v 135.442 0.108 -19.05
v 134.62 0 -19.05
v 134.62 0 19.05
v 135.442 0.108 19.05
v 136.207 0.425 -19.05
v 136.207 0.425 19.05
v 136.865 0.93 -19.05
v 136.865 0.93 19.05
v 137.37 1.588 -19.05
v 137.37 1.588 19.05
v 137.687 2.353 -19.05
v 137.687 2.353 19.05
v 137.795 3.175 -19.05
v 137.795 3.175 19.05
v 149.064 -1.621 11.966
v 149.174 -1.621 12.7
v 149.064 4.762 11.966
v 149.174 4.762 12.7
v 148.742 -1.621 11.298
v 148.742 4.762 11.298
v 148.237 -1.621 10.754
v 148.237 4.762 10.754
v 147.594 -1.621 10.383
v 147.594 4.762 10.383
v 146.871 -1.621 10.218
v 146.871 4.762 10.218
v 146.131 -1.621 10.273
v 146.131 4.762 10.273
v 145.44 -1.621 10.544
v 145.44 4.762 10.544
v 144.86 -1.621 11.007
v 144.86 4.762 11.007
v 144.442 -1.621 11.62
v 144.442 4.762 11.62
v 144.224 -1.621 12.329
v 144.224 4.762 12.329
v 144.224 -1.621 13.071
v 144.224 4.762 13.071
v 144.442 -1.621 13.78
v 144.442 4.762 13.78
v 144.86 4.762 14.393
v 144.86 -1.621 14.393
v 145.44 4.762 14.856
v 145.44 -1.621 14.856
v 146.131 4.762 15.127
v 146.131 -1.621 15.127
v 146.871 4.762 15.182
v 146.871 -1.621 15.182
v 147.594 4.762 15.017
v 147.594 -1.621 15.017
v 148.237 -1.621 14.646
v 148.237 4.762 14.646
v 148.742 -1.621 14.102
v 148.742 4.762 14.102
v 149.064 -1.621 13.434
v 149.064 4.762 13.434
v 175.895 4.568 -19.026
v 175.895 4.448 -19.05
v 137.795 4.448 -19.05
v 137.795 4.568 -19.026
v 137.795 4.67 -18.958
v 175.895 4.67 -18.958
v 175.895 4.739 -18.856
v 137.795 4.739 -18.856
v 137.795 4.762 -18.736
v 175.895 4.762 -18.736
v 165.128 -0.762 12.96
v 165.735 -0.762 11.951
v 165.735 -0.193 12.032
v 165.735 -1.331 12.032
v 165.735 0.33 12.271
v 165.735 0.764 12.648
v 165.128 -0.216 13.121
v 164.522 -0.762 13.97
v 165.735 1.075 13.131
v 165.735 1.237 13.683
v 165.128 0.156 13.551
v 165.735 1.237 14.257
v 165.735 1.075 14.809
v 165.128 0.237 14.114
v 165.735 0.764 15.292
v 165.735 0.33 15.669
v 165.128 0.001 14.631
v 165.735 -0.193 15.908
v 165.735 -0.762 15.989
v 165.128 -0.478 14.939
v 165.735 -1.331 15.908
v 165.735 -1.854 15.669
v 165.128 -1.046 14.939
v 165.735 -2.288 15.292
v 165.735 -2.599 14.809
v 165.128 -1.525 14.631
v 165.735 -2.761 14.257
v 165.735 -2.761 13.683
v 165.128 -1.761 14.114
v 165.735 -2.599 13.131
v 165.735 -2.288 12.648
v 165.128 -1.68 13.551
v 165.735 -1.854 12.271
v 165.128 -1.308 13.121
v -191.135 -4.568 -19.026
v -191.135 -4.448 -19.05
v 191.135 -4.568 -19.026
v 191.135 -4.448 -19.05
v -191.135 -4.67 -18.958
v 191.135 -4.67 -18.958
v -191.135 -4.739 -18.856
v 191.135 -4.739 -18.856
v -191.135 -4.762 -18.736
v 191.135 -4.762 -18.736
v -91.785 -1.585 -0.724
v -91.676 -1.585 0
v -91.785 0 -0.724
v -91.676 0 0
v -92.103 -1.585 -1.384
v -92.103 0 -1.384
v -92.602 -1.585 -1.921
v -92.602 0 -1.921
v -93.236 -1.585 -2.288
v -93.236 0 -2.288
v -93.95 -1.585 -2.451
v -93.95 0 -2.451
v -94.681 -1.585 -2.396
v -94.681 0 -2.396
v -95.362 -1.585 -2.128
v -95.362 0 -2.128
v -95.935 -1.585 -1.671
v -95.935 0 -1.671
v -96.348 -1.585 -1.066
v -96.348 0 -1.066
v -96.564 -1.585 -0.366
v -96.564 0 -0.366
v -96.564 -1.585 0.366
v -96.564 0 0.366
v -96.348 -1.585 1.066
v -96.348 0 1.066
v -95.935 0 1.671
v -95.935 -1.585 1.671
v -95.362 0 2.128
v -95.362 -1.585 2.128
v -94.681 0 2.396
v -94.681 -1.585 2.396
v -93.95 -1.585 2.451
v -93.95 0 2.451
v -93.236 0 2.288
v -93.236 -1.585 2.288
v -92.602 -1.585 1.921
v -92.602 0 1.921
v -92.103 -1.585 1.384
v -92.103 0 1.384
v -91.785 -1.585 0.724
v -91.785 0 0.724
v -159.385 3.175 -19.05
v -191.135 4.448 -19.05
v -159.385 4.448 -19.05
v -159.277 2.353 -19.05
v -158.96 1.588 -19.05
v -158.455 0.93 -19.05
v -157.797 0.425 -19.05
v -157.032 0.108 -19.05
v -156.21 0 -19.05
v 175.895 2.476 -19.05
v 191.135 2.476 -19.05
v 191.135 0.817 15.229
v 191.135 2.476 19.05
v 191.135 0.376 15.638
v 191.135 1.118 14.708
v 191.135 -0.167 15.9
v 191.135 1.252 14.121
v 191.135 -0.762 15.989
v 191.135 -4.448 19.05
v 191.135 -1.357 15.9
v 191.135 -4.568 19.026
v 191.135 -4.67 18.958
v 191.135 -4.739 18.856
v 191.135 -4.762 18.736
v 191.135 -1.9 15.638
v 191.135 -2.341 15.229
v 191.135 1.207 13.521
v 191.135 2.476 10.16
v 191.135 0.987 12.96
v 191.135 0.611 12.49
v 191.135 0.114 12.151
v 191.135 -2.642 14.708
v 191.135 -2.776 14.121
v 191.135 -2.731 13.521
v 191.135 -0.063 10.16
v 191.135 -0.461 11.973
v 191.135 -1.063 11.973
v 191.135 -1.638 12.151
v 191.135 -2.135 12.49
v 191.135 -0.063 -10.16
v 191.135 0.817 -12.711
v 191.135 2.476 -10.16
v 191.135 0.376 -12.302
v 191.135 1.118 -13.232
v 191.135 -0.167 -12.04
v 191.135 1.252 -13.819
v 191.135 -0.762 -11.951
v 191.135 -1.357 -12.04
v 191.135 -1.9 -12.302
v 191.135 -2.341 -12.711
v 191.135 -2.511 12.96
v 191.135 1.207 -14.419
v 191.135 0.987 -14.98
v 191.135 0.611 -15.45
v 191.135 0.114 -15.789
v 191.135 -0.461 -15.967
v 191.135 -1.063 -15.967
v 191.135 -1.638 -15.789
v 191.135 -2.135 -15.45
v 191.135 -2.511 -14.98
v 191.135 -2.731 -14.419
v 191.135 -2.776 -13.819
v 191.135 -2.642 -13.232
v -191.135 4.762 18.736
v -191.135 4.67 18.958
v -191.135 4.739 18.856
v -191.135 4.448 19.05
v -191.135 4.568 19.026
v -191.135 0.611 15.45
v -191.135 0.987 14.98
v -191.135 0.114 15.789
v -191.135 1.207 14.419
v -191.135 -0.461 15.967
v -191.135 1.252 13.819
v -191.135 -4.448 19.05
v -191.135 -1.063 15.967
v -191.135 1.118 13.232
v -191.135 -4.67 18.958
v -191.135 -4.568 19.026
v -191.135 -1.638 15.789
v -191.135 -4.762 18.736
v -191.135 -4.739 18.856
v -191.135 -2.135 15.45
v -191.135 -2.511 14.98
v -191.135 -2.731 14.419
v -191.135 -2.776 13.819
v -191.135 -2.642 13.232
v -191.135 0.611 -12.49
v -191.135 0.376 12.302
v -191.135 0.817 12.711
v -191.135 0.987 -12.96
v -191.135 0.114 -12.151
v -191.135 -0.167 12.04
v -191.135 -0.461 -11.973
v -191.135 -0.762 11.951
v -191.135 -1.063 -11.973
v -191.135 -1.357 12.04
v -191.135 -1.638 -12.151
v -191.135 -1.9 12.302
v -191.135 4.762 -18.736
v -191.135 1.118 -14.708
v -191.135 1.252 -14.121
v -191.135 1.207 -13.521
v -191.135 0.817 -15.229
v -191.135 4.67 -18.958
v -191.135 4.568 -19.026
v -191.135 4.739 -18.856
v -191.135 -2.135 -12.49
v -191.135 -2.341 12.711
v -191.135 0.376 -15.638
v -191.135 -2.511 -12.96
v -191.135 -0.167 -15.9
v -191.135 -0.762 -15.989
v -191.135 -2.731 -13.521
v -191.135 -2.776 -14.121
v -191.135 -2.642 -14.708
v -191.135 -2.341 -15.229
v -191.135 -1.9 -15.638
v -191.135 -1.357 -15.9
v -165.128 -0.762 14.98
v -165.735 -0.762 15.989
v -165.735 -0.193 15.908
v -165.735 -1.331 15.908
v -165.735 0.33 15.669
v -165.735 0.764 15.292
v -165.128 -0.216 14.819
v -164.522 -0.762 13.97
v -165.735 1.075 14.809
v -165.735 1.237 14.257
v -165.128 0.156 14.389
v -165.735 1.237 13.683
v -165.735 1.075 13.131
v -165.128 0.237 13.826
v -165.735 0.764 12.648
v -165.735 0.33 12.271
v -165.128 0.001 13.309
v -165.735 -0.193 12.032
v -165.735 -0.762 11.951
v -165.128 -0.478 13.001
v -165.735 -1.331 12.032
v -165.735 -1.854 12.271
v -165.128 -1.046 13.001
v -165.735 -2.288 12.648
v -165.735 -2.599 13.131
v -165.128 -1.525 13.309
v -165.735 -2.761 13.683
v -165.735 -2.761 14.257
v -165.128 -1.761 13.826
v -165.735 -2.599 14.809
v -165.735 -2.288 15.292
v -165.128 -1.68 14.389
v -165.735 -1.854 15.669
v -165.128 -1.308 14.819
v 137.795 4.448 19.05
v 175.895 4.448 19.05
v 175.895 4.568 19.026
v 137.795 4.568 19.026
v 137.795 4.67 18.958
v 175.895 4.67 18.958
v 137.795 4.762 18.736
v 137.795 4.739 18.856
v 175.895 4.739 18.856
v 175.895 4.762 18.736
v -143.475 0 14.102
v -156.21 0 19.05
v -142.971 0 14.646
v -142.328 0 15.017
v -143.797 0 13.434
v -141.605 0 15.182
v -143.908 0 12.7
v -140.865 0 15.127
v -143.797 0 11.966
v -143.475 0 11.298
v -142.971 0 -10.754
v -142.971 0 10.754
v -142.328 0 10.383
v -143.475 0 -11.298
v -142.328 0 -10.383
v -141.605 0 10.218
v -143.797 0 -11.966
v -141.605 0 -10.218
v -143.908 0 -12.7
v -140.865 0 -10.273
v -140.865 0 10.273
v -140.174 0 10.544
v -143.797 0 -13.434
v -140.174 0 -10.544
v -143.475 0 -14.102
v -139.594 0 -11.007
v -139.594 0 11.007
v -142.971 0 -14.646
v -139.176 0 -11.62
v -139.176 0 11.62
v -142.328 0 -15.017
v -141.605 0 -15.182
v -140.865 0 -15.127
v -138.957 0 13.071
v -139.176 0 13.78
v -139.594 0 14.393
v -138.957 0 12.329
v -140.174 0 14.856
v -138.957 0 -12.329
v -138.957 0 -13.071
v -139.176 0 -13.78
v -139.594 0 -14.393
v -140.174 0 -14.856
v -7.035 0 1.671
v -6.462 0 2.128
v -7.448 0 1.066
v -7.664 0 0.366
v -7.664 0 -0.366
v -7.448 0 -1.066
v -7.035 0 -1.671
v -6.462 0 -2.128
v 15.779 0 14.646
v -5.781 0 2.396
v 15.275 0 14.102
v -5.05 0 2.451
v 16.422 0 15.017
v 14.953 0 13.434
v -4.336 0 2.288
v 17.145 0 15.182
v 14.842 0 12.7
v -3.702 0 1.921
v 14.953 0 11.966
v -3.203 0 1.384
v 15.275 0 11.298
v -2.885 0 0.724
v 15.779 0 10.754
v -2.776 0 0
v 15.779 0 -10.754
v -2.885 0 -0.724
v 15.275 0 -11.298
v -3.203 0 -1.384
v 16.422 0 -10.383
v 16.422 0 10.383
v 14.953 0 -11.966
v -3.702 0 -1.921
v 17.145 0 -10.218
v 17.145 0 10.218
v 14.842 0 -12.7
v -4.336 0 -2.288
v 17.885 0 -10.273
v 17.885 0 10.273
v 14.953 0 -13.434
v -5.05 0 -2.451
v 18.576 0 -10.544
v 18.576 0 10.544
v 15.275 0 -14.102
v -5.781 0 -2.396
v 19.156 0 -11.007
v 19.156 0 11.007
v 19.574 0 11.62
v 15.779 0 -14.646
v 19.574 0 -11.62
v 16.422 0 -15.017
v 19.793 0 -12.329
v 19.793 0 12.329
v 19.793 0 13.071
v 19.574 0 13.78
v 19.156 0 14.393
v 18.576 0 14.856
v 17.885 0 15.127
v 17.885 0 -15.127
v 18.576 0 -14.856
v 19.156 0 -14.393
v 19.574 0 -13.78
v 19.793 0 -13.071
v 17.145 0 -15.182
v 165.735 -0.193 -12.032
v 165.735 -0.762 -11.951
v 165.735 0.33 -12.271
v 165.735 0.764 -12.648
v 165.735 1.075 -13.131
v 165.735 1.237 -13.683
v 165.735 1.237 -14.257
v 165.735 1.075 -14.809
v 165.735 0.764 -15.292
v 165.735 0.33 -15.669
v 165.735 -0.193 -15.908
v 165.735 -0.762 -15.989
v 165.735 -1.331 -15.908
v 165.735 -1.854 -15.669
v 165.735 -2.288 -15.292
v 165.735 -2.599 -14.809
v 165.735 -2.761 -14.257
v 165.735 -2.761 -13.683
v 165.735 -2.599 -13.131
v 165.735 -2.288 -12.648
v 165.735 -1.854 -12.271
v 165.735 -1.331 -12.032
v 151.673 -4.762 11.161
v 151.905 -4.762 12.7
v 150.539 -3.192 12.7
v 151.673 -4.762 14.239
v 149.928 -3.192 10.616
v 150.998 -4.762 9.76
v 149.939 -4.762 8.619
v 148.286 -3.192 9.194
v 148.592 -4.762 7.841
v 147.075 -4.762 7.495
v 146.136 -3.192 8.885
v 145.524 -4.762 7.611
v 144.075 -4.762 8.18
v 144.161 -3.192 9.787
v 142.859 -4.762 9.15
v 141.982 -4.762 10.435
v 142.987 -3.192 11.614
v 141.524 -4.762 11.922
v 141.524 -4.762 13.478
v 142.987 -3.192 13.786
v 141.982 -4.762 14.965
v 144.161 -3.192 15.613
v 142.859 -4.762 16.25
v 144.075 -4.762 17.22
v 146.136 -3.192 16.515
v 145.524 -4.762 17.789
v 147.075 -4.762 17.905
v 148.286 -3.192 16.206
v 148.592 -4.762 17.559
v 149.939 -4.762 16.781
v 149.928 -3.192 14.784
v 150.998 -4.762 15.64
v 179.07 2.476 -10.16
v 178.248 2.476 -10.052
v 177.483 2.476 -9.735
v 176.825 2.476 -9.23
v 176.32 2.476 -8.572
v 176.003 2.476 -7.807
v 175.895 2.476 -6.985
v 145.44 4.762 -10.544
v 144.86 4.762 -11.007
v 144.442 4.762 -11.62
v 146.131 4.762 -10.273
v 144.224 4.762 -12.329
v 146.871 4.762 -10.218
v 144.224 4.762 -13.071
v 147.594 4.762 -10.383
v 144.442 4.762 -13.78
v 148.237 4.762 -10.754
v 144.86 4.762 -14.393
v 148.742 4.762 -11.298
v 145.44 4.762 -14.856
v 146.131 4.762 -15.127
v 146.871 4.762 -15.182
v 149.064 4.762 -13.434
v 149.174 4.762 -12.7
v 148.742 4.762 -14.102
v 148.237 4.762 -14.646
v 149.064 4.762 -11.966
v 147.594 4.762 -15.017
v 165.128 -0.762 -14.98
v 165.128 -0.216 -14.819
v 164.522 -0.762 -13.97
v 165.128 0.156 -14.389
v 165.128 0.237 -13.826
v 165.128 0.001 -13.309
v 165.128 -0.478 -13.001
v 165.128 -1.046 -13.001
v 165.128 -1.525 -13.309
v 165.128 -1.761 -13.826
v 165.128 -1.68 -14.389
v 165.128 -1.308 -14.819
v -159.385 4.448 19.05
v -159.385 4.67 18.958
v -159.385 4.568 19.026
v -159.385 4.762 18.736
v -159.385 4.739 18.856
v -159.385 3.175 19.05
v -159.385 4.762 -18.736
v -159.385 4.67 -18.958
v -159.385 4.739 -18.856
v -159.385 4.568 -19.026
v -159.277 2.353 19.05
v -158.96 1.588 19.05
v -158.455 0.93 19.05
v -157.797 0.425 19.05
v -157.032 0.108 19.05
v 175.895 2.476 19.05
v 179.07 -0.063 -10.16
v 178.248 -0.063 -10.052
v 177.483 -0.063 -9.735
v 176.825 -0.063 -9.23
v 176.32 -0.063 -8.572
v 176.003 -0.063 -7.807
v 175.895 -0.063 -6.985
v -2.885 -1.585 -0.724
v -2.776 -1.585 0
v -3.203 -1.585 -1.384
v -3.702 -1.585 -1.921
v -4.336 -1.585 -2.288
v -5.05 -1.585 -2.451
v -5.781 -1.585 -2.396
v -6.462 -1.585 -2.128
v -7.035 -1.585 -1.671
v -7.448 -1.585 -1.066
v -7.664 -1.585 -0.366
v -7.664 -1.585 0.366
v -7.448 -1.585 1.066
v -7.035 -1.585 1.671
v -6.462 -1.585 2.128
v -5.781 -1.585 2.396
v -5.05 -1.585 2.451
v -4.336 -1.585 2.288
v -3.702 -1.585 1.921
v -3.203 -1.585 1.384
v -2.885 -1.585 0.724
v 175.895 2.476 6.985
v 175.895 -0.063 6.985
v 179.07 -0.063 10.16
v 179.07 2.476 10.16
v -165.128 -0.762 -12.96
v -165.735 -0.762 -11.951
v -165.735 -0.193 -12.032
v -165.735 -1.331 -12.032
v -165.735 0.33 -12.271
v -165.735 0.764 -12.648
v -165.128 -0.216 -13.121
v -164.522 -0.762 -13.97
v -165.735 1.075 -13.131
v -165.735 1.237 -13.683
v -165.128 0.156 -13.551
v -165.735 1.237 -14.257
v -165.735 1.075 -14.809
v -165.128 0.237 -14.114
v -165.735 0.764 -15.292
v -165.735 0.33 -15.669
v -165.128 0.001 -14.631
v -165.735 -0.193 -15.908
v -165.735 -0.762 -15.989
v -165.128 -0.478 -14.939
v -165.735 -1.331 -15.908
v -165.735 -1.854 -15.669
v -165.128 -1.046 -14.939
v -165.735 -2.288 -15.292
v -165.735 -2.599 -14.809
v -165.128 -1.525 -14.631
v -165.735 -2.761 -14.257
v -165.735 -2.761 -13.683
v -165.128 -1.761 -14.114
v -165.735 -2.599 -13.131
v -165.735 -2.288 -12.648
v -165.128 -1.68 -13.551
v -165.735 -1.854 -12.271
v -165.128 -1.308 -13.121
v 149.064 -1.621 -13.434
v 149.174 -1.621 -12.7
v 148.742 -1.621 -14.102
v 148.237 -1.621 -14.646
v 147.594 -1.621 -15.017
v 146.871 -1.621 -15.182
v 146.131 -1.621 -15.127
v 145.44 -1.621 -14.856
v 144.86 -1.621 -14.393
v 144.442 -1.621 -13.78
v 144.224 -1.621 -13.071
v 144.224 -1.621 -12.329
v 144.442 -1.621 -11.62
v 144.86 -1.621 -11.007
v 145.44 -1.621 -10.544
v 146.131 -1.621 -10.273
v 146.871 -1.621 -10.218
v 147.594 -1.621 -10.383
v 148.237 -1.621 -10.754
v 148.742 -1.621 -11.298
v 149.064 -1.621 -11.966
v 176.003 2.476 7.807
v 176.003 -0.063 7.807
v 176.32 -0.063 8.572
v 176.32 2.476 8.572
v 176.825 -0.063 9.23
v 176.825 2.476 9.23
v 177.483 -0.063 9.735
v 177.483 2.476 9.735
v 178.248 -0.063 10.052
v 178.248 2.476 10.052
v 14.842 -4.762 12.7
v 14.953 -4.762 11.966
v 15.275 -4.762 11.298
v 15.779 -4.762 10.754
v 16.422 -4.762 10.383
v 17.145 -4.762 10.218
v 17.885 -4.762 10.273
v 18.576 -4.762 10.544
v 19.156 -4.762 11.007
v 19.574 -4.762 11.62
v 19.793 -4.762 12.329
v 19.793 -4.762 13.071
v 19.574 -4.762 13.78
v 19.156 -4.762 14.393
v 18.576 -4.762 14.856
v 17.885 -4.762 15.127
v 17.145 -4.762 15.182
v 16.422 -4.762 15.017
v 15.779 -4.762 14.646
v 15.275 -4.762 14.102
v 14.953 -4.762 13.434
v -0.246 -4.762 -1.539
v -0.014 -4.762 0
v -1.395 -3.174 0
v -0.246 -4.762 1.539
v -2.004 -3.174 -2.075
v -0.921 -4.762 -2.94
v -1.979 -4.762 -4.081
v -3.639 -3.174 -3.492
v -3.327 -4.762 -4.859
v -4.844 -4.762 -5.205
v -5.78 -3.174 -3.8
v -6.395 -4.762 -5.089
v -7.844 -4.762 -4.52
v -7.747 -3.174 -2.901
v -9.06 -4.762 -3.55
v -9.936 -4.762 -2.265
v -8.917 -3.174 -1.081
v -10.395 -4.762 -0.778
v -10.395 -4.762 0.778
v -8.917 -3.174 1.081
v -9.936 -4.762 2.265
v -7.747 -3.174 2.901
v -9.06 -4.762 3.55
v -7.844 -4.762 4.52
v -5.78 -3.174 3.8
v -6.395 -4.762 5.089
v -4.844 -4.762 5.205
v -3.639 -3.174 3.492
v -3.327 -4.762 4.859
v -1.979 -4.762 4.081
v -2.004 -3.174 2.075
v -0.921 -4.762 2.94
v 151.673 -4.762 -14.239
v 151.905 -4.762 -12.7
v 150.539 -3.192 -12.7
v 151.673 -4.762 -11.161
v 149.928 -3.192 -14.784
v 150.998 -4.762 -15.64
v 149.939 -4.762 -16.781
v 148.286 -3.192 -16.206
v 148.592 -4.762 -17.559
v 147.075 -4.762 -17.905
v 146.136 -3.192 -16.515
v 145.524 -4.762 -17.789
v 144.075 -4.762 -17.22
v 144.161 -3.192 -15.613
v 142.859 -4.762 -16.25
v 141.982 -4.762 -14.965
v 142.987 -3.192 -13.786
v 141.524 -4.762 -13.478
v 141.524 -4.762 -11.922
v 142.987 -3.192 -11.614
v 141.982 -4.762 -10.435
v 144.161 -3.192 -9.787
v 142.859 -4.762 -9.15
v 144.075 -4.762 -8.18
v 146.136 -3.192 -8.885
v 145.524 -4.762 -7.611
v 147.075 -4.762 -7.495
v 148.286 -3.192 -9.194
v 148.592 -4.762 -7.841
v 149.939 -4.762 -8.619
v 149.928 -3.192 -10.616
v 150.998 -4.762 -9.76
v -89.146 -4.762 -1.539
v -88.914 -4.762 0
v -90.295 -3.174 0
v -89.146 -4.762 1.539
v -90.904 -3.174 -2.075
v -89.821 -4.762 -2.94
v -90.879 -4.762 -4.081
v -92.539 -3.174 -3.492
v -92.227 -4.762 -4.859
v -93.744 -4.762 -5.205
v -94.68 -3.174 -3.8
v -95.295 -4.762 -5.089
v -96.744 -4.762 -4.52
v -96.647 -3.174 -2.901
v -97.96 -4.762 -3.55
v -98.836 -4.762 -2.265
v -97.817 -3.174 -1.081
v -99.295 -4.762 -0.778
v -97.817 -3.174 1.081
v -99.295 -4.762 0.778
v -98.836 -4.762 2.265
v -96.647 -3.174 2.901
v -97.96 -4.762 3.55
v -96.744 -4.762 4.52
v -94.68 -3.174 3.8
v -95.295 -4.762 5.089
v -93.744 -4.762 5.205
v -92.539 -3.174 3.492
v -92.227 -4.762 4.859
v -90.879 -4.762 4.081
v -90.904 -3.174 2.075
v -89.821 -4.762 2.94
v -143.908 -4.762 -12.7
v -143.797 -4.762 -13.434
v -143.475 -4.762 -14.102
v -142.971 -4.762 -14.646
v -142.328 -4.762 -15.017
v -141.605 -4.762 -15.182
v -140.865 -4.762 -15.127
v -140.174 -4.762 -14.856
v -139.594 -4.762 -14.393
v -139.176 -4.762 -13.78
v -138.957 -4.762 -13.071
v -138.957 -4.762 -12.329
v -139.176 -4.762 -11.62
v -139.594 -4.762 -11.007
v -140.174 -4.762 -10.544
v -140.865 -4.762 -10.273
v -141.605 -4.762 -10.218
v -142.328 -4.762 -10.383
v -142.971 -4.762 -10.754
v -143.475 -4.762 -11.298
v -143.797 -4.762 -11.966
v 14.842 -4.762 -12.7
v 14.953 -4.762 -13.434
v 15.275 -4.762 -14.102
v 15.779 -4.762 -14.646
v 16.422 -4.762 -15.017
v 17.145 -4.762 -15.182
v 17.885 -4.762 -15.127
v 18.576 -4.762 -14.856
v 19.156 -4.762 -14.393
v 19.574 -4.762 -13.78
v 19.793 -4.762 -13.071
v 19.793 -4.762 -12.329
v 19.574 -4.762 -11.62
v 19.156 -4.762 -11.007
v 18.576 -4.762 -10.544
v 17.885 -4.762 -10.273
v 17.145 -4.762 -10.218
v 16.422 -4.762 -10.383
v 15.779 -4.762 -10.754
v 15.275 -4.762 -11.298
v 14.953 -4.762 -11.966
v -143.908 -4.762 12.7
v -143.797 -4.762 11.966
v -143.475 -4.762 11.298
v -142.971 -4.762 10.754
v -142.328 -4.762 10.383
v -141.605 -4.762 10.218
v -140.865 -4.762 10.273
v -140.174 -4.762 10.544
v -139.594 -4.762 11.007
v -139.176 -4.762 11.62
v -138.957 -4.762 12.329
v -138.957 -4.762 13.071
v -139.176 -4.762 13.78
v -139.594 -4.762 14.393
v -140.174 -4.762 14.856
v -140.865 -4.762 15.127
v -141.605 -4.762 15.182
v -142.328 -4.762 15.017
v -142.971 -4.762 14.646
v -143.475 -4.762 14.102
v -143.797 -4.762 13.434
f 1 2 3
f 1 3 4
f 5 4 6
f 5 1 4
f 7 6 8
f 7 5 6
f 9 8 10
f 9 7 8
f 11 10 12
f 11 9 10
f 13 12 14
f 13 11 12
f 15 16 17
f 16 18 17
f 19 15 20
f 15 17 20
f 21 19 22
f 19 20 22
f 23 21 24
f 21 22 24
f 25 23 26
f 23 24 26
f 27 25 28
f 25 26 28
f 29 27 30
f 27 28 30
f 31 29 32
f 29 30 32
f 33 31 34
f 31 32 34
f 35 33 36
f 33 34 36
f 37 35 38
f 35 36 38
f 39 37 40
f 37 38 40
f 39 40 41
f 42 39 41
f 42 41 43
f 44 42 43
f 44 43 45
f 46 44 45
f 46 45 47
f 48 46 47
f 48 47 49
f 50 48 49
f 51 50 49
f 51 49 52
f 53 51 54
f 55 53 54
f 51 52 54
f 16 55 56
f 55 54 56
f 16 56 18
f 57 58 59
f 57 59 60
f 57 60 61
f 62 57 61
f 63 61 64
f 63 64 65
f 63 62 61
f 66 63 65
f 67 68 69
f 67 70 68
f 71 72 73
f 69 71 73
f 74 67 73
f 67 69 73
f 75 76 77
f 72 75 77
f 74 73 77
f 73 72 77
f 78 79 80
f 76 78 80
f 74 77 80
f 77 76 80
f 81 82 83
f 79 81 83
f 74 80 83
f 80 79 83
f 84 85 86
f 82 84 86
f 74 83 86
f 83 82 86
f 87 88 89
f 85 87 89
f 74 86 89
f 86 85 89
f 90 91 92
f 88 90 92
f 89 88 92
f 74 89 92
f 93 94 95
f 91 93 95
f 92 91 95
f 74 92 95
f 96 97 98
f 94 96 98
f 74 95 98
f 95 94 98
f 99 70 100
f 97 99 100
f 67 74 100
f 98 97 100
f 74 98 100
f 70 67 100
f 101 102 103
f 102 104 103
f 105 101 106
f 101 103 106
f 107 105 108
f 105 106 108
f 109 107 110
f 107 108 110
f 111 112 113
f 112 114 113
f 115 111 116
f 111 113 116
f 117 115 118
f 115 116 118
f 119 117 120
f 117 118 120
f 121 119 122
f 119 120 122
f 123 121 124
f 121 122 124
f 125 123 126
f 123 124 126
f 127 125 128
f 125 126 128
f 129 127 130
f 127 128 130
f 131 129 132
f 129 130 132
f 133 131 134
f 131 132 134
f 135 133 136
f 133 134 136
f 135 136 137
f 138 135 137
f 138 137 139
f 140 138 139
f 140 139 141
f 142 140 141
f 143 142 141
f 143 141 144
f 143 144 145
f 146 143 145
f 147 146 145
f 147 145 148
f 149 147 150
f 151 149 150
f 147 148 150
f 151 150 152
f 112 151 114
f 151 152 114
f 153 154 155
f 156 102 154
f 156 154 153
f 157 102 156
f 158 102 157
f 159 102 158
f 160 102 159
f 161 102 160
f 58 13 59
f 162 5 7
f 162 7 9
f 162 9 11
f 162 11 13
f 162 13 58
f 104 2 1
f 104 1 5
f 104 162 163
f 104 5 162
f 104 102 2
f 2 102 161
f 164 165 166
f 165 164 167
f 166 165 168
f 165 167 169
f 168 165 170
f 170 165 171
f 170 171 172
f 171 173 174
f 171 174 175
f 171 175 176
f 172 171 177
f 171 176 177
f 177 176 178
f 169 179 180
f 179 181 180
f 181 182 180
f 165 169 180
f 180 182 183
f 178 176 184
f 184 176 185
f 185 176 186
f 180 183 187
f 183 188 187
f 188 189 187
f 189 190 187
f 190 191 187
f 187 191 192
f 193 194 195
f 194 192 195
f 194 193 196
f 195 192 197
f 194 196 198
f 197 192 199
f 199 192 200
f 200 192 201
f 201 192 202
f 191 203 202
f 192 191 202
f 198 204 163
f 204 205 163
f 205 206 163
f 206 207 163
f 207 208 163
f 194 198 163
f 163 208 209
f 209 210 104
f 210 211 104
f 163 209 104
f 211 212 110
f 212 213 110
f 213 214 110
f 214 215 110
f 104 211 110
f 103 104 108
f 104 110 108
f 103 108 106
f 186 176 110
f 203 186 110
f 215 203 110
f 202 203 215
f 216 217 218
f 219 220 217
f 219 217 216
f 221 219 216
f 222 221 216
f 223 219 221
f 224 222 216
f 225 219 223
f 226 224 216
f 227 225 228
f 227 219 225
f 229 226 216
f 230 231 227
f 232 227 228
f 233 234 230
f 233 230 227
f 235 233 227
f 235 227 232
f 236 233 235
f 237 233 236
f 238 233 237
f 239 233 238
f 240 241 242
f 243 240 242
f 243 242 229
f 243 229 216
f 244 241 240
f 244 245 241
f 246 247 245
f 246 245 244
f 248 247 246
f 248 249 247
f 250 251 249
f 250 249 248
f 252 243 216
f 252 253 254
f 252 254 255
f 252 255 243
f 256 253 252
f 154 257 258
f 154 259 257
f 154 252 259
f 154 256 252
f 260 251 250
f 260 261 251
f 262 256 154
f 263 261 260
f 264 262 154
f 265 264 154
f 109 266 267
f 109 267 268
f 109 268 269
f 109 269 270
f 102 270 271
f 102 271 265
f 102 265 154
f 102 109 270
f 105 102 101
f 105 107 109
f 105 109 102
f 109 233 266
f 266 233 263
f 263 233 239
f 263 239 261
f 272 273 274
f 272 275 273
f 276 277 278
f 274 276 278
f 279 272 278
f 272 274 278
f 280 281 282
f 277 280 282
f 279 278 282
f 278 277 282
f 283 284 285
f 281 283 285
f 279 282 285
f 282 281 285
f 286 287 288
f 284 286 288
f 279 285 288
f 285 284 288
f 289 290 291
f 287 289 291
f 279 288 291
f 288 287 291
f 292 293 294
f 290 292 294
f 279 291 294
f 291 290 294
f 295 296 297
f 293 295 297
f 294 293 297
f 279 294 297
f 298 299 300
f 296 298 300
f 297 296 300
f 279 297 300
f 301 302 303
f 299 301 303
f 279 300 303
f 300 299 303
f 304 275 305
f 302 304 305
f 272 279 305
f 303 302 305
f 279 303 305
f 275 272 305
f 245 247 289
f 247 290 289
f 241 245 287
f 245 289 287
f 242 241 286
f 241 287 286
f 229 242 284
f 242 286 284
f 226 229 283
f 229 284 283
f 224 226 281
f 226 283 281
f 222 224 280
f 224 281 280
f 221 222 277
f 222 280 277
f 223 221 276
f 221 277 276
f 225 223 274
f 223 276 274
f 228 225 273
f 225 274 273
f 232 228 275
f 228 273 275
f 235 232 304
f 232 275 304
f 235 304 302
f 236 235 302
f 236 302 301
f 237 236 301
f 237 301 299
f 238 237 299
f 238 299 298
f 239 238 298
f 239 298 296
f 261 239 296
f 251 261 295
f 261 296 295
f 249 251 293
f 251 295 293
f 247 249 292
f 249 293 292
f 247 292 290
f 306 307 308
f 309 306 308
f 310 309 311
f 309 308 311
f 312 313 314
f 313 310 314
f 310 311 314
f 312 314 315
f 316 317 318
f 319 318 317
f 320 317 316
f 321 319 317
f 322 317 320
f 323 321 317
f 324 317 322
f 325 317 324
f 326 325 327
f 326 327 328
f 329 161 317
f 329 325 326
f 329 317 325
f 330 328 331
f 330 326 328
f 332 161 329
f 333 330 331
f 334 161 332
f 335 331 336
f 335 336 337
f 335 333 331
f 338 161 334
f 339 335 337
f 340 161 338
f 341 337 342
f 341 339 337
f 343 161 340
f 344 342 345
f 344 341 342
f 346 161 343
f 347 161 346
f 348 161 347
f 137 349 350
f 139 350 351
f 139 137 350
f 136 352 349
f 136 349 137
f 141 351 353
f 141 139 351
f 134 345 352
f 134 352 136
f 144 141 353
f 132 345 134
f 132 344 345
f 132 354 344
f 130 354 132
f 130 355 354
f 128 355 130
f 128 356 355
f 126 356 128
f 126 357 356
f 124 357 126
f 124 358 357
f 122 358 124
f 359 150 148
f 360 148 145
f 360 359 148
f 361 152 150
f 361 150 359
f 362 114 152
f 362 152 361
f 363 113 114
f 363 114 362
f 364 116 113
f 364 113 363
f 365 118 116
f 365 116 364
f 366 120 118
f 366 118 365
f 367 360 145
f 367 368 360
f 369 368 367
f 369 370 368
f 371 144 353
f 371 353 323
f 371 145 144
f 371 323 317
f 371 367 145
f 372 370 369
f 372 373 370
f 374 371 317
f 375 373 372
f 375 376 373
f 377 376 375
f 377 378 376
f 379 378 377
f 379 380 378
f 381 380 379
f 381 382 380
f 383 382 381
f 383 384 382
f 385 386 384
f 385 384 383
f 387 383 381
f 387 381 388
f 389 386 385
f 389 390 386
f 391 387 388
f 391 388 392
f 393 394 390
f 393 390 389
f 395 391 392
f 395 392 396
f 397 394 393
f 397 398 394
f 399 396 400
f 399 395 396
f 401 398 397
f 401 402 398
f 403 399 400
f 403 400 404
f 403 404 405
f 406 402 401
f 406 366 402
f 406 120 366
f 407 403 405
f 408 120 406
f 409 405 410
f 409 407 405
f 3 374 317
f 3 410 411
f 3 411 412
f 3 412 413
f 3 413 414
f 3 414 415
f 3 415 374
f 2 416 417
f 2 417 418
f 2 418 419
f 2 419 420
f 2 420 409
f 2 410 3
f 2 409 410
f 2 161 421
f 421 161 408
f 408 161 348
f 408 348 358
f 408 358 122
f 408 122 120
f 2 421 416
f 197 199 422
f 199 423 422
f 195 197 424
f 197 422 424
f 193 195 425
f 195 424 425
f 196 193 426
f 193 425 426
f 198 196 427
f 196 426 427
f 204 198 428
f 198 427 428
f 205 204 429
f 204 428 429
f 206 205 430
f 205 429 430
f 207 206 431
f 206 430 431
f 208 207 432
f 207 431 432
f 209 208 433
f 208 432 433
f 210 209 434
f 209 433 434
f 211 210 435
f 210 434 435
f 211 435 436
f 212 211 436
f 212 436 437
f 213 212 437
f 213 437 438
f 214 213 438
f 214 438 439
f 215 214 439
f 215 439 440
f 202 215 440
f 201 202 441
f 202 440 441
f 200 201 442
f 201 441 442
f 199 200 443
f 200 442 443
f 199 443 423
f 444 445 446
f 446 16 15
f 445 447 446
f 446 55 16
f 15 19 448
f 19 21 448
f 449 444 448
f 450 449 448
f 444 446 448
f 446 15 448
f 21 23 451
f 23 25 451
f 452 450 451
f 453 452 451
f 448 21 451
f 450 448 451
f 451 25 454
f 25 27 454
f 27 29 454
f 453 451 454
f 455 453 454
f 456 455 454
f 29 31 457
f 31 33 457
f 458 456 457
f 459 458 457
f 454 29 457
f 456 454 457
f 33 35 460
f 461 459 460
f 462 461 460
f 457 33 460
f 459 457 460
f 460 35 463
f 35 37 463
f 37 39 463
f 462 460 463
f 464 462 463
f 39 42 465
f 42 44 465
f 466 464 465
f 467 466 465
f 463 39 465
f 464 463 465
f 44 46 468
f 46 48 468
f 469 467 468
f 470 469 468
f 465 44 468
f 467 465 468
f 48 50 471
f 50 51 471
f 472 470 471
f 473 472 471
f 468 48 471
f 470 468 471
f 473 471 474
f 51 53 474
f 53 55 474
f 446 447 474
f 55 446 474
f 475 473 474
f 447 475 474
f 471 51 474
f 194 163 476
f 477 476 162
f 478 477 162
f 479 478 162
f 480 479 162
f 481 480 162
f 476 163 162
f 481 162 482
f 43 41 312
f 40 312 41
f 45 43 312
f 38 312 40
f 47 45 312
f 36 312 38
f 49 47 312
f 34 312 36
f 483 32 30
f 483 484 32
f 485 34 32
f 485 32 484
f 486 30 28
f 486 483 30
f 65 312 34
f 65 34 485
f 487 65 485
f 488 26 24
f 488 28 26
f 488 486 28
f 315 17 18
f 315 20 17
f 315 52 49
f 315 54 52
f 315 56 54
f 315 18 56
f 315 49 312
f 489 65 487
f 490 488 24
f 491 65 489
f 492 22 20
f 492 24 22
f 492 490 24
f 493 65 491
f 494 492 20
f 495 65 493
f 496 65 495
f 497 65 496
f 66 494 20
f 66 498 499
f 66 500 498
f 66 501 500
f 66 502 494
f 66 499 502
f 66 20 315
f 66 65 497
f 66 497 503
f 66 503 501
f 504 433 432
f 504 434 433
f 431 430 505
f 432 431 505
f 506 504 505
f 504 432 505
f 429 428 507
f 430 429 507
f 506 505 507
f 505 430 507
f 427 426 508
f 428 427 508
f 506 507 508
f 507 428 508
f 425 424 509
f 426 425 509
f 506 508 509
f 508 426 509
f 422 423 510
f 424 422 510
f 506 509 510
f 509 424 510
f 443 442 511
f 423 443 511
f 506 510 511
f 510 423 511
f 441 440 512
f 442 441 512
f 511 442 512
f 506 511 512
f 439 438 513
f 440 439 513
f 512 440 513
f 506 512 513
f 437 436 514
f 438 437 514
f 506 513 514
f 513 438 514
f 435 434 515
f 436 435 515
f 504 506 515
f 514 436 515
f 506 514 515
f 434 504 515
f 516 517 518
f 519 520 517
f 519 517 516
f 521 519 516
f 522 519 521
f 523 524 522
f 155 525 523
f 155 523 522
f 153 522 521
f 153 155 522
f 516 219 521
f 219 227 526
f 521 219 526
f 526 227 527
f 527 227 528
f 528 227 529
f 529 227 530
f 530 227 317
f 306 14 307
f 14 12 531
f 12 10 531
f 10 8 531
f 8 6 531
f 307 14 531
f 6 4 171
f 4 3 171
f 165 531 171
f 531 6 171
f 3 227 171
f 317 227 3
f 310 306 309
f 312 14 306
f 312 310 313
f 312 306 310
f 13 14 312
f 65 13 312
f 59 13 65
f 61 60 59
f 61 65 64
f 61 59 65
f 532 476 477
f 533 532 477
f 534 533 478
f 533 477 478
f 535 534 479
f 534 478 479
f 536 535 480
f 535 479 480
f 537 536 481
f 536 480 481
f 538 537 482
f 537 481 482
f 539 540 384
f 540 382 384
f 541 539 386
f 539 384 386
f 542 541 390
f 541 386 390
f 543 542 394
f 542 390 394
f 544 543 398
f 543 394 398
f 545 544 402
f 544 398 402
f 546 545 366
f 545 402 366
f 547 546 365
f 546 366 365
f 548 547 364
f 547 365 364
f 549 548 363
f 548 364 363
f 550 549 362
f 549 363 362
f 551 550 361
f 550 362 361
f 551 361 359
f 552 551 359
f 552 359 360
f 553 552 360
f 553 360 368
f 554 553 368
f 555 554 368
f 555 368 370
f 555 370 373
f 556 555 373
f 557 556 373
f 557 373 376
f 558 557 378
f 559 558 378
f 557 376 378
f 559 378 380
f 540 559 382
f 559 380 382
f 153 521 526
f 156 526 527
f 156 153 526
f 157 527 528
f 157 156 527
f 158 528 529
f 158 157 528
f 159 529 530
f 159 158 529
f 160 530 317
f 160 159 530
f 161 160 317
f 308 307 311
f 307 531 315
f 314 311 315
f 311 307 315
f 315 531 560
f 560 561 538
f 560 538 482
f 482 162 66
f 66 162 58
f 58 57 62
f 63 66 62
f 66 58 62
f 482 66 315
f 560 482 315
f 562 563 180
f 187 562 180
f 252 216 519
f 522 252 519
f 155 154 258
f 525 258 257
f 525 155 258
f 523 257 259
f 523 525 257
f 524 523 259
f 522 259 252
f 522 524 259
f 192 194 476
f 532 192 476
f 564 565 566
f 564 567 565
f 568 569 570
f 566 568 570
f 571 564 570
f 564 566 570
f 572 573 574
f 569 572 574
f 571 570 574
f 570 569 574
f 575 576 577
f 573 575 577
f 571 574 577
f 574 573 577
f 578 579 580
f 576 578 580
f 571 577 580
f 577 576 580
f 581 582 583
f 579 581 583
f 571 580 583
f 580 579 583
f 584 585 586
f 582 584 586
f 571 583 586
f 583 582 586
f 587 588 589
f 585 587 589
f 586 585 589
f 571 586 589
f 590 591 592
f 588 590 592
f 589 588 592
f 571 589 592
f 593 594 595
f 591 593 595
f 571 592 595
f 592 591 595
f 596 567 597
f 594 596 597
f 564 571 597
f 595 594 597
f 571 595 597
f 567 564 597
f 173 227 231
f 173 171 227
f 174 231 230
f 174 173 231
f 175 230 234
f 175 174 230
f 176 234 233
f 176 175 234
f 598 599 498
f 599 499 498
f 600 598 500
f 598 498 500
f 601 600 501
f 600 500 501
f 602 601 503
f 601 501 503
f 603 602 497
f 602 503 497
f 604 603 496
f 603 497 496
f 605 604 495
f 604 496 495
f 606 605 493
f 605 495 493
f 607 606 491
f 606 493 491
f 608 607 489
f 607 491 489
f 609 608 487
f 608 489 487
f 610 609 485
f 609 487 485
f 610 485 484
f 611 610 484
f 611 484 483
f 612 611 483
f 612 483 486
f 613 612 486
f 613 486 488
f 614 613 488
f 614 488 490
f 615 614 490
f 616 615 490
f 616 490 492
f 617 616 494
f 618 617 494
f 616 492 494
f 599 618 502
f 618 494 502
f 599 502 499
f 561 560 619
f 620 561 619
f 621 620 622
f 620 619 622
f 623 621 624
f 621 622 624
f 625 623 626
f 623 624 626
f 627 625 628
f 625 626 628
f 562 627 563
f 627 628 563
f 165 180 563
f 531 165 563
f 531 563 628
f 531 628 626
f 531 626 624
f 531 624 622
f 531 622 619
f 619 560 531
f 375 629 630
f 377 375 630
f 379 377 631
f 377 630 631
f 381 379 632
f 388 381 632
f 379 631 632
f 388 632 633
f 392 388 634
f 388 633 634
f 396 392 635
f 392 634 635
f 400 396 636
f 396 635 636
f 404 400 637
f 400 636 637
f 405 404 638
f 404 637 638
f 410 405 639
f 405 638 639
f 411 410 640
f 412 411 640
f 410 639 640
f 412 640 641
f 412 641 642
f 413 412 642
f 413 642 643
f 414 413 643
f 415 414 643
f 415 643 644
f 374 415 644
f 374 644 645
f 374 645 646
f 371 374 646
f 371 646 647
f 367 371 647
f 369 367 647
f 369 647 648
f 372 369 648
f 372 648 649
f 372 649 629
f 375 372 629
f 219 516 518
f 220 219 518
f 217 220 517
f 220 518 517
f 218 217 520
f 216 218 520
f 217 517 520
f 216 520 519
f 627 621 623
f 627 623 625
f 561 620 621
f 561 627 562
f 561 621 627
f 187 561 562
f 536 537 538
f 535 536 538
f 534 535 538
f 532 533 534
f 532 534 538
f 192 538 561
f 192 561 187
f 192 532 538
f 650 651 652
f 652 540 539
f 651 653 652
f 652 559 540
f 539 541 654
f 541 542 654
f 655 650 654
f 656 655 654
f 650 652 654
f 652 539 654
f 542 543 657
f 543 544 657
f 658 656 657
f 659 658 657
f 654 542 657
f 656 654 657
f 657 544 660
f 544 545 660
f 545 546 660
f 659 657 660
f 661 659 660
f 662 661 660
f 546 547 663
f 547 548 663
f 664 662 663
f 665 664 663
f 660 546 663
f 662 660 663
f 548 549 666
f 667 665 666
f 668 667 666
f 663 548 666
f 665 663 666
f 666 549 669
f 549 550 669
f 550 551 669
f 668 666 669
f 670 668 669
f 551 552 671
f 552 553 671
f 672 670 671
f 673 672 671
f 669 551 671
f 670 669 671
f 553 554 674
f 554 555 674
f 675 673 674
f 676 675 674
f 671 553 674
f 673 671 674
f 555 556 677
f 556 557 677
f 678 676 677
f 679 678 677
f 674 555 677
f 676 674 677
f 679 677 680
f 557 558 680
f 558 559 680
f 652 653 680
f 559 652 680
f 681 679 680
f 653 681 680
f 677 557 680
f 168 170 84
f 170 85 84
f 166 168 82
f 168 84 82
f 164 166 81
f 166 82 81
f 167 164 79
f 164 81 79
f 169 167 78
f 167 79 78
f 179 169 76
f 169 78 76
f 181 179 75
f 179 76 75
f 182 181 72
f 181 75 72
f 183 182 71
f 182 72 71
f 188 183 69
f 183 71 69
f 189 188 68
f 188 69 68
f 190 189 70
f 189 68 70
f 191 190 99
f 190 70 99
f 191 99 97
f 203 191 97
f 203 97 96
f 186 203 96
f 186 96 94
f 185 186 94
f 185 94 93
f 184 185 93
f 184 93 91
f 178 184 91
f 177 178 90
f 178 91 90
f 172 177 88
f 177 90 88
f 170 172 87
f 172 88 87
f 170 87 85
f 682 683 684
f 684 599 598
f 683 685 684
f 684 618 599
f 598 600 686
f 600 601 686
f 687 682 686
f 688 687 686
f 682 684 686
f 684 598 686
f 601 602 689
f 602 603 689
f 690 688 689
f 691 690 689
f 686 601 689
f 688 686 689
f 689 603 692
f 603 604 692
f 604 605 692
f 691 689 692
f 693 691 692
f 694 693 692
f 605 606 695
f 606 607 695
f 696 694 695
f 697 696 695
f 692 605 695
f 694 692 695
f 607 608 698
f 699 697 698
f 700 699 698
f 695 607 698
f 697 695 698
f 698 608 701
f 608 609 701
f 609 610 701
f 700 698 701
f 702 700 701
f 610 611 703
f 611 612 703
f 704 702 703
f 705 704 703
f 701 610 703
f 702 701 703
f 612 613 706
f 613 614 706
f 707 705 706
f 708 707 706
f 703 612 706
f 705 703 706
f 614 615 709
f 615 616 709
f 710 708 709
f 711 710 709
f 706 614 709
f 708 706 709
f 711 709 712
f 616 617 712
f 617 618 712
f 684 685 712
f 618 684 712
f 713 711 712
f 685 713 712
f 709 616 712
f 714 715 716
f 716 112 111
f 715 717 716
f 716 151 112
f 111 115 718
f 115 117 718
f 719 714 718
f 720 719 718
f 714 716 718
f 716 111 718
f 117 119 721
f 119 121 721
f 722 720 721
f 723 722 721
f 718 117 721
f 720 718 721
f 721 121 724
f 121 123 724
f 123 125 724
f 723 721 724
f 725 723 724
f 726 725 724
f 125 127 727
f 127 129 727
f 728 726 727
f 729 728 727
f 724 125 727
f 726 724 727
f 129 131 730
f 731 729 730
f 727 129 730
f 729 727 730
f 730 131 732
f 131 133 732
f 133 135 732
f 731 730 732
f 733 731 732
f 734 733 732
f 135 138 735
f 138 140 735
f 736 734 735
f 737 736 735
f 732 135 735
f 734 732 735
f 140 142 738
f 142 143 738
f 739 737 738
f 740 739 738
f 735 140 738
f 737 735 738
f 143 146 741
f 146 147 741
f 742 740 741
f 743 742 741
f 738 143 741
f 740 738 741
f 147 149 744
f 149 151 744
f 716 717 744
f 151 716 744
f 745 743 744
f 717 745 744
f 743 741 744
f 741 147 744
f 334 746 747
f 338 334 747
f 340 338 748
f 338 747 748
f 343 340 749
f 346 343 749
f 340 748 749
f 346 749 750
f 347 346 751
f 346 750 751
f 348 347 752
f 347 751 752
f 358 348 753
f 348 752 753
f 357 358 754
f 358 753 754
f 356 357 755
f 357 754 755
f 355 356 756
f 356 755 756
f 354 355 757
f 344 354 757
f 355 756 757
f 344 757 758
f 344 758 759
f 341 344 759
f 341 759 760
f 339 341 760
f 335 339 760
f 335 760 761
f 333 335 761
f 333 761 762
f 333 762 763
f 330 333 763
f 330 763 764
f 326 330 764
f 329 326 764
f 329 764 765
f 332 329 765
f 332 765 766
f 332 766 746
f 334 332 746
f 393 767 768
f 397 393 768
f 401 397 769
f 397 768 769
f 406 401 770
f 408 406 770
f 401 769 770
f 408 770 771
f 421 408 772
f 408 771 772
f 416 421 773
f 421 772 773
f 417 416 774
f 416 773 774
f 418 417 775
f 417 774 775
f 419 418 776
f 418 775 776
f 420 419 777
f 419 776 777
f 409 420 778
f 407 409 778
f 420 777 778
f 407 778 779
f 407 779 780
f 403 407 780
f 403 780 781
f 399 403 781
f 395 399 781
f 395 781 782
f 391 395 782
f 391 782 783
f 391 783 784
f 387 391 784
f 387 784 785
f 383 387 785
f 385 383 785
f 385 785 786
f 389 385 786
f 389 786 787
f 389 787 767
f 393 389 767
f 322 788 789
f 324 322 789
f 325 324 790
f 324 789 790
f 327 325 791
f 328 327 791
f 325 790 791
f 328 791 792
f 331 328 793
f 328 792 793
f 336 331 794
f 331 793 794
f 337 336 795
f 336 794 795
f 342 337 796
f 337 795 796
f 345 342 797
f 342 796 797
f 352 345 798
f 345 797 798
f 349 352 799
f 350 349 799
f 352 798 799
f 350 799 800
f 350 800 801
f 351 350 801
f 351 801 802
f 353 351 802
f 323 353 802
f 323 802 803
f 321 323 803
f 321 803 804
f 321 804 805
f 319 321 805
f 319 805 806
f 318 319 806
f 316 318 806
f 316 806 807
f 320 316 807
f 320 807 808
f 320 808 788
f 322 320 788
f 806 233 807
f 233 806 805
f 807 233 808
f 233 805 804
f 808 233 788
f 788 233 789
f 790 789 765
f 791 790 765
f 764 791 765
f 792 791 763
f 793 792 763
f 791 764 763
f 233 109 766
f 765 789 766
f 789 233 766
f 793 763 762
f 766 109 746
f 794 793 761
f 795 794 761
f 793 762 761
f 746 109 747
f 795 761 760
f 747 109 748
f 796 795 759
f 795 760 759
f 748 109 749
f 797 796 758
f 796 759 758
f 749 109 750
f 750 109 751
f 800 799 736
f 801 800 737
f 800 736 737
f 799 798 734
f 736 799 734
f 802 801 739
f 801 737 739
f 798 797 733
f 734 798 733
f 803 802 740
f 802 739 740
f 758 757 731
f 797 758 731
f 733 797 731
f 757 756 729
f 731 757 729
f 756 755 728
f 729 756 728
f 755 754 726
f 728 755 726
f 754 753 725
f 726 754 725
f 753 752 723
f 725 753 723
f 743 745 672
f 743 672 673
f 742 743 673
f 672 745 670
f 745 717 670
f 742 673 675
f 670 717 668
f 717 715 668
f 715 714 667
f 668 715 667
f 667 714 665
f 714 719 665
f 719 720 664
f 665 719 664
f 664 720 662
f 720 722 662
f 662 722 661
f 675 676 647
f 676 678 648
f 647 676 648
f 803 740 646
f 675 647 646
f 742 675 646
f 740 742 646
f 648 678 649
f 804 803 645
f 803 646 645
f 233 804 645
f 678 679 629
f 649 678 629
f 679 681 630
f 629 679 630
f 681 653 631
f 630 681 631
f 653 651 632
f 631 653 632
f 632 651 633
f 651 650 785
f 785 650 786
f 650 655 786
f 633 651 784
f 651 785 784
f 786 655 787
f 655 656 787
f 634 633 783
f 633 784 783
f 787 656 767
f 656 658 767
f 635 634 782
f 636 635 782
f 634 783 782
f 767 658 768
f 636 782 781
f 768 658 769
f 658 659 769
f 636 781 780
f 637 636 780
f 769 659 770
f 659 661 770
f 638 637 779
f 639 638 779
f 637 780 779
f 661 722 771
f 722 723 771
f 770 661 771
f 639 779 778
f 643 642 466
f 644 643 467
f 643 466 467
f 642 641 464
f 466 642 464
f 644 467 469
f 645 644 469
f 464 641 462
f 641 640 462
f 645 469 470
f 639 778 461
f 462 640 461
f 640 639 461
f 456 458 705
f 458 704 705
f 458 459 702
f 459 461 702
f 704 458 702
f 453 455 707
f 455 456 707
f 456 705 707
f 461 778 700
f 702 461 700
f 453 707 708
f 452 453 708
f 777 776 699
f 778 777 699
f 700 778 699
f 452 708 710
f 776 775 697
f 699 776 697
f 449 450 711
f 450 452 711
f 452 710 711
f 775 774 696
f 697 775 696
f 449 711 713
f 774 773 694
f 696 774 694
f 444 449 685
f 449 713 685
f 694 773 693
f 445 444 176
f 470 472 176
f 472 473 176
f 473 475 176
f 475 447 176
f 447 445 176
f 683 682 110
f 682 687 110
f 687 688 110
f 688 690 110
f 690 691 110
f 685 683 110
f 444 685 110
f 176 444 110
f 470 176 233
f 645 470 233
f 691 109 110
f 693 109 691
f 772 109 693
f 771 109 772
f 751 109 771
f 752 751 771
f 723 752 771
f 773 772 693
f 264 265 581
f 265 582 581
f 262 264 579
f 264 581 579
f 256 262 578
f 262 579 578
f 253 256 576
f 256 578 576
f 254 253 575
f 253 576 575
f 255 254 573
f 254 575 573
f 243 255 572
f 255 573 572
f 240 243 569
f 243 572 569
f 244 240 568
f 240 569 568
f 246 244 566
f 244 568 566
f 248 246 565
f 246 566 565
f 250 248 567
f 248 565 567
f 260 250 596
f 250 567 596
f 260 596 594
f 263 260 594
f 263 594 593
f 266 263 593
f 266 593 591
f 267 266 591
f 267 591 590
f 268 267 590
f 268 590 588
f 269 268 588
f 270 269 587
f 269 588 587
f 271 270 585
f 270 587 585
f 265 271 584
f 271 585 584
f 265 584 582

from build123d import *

# Parameters (mm, degrees)
BOSS_EXTRUDE1_DEPTH                    = 4.7625
BOSS_EXTRUDE1_DEPTH_BACK               = 4.7625
SKETCH3_W                              = 382.27
SKETCH3_H                              = 38.1
FILLET1_R                              = 0.314325
TAP_DRILL_FOR_10_32_TAP1_D             = 4.0386
TAP_DRILL_FOR_10_32_TAP1_DEPTH         = 25.4
TAP_DRILL_FOR_10_32_TAP1_TIP           = 1.213317848
TAP_DRILL_FOR_10_32_TAP2_D             = 4.0386
TAP_DRILL_FOR_10_32_TAP2_DEPTH         = 25.4
TAP_DRILL_FOR_10_32_TAP2_TIP           = 1.213317848
SKETCH10_W                             = 15.24
SKETCH10_H                             = 2.286
CUT_EXTRUDE1_DEPTH                     = 195.953531979
F_10_CLEARANCE_HOLE1_D                 = 4.9784
F_10_CLEARANCE_HOLE1_CSINK_D           = 10.4394
F_10_CLEARANCE_HOLE1_CSINK_ANGLE       = 82
CUT_EXTRUDE2_DEPTH                     = 2.54
F_10_CLEARANCE_HOLE2_D                 = 4.9784
F_10_0_1935_DIAMETER_HOLE1_D           = 4.9149
F_10_0_1935_DIAMETER_HOLE1_CSINK_D     = 10.4394
F_10_0_1935_DIAMETER_HOLE1_CSINK_ANGLE = 82


with BuildPart() as part:
    # Sketch3 → Boss-Extrude1 (new, two sides: drawn at the far end of the back side and taken through both)
    with BuildSketch(Plane(origin=(0, 0, 0), x_dir=(1, 0, 0), z_dir=(0, 1, 0)).offset(-BOSS_EXTRUDE1_DEPTH_BACK)):
        Rectangle(SKETCH3_W, SKETCH3_H)
    extrude(amount=BOSS_EXTRUDE1_DEPTH + BOSS_EXTRUDE1_DEPTH_BACK)

    # Fillet1
    fillet1_edges = [part.edges().sort_by_distance(p)[0] for p in [
        (0, 4.7625, 19.05),
        (0, -4.7625, -19.05),
        (0, 4.7625, -19.05),
        (0, -4.7625, 19.05),
    ]]
    fillet(fillet1_edges, radius=FILLET1_R)

    # Tap Drill for #10-32 Tap1
    with Locations(Plane.ZY.offset(191.135)):
        with Locations((-13.97, -0.762), (13.97, -0.762)):
            Hole(TAP_DRILL_FOR_10_32_TAP1_D / 2, depth=TAP_DRILL_FOR_10_32_TAP1_DEPTH)
            with Locations((0, 0, -(TAP_DRILL_FOR_10_32_TAP1_DEPTH + TAP_DRILL_FOR_10_32_TAP1_TIP / 2))):  # 118° drill point
                Cone(0, TAP_DRILL_FOR_10_32_TAP1_D / 2, TAP_DRILL_FOR_10_32_TAP1_TIP, mode=Mode.SUBTRACT)

    # Tap Drill for #10-32 Tap2
    with Locations(Plane(origin=(191.135, 0, 0), x_dir=(0, 0, -1), z_dir=(1, 0, 0))):
        with Locations((-13.97, -0.762), (13.97, -0.762)):
            Hole(TAP_DRILL_FOR_10_32_TAP2_D / 2, depth=TAP_DRILL_FOR_10_32_TAP2_DEPTH)
            with Locations((0, 0, -(TAP_DRILL_FOR_10_32_TAP2_DEPTH + TAP_DRILL_FOR_10_32_TAP2_TIP / 2))):  # 118° drill point
                Cone(0, TAP_DRILL_FOR_10_32_TAP2_D / 2, TAP_DRILL_FOR_10_32_TAP2_TIP, mode=Mode.SUBTRACT)

    # Sketch10 → Cut-Extrude1 (cut, through all)
    with BuildSketch(Plane(origin=(0, 0, -19.05), x_dir=(-1, 0, 0), z_dir=(0, 0, -1))):
        with BuildLine():
            Line((159.385, 4.7625), (159.385, 3.175))
            ThreePointArc((159.385, 3.175), (158.45506403, 0.92993597), (156.21, 0))
            Line((156.21, 0), (-134.62, 0))
            ThreePointArc((-134.62, 0), (-136.86506403, 0.92993597), (-137.795, 3.175))
            Line((-137.795, 3.175), (-137.795, 4.7625))
            Line((-137.795, 4.7625), (159.385, 4.7625))
        make_face()
        with Locations((-183.515, 3.6195)):
            Rectangle(SKETCH10_W, SKETCH10_H)
    extrude(amount=-CUT_EXTRUDE1_DEPTH, mode=Mode.SUBTRACT)

    # #10 Clearance Hole1 (through all)
    with Locations(Plane(origin=(0, -4.7625, 0), x_dir=(-1, 0, 0), z_dir=(0, -1, 0))):
        with Locations((-146.685, 12.7), (-146.685, -12.7)):
            CounterSinkHole(F_10_CLEARANCE_HOLE1_D / 2, F_10_CLEARANCE_HOLE1_CSINK_D / 2, counter_sink_angle=F_10_CLEARANCE_HOLE1_CSINK_ANGLE)

    # Sketch17 → Cut-Extrude2 (cut)
    with BuildSketch(Plane(origin=(0, 2.4765, 0), x_dir=(1, 0, 0), z_dir=(0, 1, 0))):
        with BuildLine():
            Line((191.135, 0), (191.135, 10.16))
            Line((191.135, 10.16), (179.07, 10.16))
            ThreePointArc((179.07, 10.16), (176.82493597, 9.23006403), (175.895, 6.985))
            Line((175.895, 6.985), (175.895, -6.985))
            ThreePointArc((175.895, -6.985), (176.82493597, -9.23006403), (179.07, -10.16))
            Line((179.07, -10.16), (191.135, -10.16))
            Line((191.135, -10.16), (191.135, 0))
        make_face()
    extrude(amount=-CUT_EXTRUDE2_DEPTH, mode=Mode.SUBTRACT)

    # #10 Clearance Hole2 (through all)
    with Locations(Plane(origin=(0, 0, 0), x_dir=(1, 0, 0), z_dir=(0, 1, 0))):
        with Locations((-141.418780002, 12.7), (-141.418780002, -12.7), (17.331219998, 12.7), (17.331219998, -12.7)):
            Hole(F_10_CLEARANCE_HOLE2_D / 2)

    # #10 (0.1935) Diameter Hole1 (through all)
    with Locations(Plane(origin=(0, -4.7625, 0), x_dir=(-1, 0, 0), z_dir=(0, -1, 0))):
        with Locations((94.13370554, 0), (5.23370554, 0)):
            CounterSinkHole(F_10_0_1935_DIAMETER_HOLE1_D / 2, F_10_0_1935_DIAMETER_HOLE1_CSINK_D / 2, counter_sink_angle=F_10_0_1935_DIAMETER_HOLE1_CSINK_ANGLE)


solid = part.part
